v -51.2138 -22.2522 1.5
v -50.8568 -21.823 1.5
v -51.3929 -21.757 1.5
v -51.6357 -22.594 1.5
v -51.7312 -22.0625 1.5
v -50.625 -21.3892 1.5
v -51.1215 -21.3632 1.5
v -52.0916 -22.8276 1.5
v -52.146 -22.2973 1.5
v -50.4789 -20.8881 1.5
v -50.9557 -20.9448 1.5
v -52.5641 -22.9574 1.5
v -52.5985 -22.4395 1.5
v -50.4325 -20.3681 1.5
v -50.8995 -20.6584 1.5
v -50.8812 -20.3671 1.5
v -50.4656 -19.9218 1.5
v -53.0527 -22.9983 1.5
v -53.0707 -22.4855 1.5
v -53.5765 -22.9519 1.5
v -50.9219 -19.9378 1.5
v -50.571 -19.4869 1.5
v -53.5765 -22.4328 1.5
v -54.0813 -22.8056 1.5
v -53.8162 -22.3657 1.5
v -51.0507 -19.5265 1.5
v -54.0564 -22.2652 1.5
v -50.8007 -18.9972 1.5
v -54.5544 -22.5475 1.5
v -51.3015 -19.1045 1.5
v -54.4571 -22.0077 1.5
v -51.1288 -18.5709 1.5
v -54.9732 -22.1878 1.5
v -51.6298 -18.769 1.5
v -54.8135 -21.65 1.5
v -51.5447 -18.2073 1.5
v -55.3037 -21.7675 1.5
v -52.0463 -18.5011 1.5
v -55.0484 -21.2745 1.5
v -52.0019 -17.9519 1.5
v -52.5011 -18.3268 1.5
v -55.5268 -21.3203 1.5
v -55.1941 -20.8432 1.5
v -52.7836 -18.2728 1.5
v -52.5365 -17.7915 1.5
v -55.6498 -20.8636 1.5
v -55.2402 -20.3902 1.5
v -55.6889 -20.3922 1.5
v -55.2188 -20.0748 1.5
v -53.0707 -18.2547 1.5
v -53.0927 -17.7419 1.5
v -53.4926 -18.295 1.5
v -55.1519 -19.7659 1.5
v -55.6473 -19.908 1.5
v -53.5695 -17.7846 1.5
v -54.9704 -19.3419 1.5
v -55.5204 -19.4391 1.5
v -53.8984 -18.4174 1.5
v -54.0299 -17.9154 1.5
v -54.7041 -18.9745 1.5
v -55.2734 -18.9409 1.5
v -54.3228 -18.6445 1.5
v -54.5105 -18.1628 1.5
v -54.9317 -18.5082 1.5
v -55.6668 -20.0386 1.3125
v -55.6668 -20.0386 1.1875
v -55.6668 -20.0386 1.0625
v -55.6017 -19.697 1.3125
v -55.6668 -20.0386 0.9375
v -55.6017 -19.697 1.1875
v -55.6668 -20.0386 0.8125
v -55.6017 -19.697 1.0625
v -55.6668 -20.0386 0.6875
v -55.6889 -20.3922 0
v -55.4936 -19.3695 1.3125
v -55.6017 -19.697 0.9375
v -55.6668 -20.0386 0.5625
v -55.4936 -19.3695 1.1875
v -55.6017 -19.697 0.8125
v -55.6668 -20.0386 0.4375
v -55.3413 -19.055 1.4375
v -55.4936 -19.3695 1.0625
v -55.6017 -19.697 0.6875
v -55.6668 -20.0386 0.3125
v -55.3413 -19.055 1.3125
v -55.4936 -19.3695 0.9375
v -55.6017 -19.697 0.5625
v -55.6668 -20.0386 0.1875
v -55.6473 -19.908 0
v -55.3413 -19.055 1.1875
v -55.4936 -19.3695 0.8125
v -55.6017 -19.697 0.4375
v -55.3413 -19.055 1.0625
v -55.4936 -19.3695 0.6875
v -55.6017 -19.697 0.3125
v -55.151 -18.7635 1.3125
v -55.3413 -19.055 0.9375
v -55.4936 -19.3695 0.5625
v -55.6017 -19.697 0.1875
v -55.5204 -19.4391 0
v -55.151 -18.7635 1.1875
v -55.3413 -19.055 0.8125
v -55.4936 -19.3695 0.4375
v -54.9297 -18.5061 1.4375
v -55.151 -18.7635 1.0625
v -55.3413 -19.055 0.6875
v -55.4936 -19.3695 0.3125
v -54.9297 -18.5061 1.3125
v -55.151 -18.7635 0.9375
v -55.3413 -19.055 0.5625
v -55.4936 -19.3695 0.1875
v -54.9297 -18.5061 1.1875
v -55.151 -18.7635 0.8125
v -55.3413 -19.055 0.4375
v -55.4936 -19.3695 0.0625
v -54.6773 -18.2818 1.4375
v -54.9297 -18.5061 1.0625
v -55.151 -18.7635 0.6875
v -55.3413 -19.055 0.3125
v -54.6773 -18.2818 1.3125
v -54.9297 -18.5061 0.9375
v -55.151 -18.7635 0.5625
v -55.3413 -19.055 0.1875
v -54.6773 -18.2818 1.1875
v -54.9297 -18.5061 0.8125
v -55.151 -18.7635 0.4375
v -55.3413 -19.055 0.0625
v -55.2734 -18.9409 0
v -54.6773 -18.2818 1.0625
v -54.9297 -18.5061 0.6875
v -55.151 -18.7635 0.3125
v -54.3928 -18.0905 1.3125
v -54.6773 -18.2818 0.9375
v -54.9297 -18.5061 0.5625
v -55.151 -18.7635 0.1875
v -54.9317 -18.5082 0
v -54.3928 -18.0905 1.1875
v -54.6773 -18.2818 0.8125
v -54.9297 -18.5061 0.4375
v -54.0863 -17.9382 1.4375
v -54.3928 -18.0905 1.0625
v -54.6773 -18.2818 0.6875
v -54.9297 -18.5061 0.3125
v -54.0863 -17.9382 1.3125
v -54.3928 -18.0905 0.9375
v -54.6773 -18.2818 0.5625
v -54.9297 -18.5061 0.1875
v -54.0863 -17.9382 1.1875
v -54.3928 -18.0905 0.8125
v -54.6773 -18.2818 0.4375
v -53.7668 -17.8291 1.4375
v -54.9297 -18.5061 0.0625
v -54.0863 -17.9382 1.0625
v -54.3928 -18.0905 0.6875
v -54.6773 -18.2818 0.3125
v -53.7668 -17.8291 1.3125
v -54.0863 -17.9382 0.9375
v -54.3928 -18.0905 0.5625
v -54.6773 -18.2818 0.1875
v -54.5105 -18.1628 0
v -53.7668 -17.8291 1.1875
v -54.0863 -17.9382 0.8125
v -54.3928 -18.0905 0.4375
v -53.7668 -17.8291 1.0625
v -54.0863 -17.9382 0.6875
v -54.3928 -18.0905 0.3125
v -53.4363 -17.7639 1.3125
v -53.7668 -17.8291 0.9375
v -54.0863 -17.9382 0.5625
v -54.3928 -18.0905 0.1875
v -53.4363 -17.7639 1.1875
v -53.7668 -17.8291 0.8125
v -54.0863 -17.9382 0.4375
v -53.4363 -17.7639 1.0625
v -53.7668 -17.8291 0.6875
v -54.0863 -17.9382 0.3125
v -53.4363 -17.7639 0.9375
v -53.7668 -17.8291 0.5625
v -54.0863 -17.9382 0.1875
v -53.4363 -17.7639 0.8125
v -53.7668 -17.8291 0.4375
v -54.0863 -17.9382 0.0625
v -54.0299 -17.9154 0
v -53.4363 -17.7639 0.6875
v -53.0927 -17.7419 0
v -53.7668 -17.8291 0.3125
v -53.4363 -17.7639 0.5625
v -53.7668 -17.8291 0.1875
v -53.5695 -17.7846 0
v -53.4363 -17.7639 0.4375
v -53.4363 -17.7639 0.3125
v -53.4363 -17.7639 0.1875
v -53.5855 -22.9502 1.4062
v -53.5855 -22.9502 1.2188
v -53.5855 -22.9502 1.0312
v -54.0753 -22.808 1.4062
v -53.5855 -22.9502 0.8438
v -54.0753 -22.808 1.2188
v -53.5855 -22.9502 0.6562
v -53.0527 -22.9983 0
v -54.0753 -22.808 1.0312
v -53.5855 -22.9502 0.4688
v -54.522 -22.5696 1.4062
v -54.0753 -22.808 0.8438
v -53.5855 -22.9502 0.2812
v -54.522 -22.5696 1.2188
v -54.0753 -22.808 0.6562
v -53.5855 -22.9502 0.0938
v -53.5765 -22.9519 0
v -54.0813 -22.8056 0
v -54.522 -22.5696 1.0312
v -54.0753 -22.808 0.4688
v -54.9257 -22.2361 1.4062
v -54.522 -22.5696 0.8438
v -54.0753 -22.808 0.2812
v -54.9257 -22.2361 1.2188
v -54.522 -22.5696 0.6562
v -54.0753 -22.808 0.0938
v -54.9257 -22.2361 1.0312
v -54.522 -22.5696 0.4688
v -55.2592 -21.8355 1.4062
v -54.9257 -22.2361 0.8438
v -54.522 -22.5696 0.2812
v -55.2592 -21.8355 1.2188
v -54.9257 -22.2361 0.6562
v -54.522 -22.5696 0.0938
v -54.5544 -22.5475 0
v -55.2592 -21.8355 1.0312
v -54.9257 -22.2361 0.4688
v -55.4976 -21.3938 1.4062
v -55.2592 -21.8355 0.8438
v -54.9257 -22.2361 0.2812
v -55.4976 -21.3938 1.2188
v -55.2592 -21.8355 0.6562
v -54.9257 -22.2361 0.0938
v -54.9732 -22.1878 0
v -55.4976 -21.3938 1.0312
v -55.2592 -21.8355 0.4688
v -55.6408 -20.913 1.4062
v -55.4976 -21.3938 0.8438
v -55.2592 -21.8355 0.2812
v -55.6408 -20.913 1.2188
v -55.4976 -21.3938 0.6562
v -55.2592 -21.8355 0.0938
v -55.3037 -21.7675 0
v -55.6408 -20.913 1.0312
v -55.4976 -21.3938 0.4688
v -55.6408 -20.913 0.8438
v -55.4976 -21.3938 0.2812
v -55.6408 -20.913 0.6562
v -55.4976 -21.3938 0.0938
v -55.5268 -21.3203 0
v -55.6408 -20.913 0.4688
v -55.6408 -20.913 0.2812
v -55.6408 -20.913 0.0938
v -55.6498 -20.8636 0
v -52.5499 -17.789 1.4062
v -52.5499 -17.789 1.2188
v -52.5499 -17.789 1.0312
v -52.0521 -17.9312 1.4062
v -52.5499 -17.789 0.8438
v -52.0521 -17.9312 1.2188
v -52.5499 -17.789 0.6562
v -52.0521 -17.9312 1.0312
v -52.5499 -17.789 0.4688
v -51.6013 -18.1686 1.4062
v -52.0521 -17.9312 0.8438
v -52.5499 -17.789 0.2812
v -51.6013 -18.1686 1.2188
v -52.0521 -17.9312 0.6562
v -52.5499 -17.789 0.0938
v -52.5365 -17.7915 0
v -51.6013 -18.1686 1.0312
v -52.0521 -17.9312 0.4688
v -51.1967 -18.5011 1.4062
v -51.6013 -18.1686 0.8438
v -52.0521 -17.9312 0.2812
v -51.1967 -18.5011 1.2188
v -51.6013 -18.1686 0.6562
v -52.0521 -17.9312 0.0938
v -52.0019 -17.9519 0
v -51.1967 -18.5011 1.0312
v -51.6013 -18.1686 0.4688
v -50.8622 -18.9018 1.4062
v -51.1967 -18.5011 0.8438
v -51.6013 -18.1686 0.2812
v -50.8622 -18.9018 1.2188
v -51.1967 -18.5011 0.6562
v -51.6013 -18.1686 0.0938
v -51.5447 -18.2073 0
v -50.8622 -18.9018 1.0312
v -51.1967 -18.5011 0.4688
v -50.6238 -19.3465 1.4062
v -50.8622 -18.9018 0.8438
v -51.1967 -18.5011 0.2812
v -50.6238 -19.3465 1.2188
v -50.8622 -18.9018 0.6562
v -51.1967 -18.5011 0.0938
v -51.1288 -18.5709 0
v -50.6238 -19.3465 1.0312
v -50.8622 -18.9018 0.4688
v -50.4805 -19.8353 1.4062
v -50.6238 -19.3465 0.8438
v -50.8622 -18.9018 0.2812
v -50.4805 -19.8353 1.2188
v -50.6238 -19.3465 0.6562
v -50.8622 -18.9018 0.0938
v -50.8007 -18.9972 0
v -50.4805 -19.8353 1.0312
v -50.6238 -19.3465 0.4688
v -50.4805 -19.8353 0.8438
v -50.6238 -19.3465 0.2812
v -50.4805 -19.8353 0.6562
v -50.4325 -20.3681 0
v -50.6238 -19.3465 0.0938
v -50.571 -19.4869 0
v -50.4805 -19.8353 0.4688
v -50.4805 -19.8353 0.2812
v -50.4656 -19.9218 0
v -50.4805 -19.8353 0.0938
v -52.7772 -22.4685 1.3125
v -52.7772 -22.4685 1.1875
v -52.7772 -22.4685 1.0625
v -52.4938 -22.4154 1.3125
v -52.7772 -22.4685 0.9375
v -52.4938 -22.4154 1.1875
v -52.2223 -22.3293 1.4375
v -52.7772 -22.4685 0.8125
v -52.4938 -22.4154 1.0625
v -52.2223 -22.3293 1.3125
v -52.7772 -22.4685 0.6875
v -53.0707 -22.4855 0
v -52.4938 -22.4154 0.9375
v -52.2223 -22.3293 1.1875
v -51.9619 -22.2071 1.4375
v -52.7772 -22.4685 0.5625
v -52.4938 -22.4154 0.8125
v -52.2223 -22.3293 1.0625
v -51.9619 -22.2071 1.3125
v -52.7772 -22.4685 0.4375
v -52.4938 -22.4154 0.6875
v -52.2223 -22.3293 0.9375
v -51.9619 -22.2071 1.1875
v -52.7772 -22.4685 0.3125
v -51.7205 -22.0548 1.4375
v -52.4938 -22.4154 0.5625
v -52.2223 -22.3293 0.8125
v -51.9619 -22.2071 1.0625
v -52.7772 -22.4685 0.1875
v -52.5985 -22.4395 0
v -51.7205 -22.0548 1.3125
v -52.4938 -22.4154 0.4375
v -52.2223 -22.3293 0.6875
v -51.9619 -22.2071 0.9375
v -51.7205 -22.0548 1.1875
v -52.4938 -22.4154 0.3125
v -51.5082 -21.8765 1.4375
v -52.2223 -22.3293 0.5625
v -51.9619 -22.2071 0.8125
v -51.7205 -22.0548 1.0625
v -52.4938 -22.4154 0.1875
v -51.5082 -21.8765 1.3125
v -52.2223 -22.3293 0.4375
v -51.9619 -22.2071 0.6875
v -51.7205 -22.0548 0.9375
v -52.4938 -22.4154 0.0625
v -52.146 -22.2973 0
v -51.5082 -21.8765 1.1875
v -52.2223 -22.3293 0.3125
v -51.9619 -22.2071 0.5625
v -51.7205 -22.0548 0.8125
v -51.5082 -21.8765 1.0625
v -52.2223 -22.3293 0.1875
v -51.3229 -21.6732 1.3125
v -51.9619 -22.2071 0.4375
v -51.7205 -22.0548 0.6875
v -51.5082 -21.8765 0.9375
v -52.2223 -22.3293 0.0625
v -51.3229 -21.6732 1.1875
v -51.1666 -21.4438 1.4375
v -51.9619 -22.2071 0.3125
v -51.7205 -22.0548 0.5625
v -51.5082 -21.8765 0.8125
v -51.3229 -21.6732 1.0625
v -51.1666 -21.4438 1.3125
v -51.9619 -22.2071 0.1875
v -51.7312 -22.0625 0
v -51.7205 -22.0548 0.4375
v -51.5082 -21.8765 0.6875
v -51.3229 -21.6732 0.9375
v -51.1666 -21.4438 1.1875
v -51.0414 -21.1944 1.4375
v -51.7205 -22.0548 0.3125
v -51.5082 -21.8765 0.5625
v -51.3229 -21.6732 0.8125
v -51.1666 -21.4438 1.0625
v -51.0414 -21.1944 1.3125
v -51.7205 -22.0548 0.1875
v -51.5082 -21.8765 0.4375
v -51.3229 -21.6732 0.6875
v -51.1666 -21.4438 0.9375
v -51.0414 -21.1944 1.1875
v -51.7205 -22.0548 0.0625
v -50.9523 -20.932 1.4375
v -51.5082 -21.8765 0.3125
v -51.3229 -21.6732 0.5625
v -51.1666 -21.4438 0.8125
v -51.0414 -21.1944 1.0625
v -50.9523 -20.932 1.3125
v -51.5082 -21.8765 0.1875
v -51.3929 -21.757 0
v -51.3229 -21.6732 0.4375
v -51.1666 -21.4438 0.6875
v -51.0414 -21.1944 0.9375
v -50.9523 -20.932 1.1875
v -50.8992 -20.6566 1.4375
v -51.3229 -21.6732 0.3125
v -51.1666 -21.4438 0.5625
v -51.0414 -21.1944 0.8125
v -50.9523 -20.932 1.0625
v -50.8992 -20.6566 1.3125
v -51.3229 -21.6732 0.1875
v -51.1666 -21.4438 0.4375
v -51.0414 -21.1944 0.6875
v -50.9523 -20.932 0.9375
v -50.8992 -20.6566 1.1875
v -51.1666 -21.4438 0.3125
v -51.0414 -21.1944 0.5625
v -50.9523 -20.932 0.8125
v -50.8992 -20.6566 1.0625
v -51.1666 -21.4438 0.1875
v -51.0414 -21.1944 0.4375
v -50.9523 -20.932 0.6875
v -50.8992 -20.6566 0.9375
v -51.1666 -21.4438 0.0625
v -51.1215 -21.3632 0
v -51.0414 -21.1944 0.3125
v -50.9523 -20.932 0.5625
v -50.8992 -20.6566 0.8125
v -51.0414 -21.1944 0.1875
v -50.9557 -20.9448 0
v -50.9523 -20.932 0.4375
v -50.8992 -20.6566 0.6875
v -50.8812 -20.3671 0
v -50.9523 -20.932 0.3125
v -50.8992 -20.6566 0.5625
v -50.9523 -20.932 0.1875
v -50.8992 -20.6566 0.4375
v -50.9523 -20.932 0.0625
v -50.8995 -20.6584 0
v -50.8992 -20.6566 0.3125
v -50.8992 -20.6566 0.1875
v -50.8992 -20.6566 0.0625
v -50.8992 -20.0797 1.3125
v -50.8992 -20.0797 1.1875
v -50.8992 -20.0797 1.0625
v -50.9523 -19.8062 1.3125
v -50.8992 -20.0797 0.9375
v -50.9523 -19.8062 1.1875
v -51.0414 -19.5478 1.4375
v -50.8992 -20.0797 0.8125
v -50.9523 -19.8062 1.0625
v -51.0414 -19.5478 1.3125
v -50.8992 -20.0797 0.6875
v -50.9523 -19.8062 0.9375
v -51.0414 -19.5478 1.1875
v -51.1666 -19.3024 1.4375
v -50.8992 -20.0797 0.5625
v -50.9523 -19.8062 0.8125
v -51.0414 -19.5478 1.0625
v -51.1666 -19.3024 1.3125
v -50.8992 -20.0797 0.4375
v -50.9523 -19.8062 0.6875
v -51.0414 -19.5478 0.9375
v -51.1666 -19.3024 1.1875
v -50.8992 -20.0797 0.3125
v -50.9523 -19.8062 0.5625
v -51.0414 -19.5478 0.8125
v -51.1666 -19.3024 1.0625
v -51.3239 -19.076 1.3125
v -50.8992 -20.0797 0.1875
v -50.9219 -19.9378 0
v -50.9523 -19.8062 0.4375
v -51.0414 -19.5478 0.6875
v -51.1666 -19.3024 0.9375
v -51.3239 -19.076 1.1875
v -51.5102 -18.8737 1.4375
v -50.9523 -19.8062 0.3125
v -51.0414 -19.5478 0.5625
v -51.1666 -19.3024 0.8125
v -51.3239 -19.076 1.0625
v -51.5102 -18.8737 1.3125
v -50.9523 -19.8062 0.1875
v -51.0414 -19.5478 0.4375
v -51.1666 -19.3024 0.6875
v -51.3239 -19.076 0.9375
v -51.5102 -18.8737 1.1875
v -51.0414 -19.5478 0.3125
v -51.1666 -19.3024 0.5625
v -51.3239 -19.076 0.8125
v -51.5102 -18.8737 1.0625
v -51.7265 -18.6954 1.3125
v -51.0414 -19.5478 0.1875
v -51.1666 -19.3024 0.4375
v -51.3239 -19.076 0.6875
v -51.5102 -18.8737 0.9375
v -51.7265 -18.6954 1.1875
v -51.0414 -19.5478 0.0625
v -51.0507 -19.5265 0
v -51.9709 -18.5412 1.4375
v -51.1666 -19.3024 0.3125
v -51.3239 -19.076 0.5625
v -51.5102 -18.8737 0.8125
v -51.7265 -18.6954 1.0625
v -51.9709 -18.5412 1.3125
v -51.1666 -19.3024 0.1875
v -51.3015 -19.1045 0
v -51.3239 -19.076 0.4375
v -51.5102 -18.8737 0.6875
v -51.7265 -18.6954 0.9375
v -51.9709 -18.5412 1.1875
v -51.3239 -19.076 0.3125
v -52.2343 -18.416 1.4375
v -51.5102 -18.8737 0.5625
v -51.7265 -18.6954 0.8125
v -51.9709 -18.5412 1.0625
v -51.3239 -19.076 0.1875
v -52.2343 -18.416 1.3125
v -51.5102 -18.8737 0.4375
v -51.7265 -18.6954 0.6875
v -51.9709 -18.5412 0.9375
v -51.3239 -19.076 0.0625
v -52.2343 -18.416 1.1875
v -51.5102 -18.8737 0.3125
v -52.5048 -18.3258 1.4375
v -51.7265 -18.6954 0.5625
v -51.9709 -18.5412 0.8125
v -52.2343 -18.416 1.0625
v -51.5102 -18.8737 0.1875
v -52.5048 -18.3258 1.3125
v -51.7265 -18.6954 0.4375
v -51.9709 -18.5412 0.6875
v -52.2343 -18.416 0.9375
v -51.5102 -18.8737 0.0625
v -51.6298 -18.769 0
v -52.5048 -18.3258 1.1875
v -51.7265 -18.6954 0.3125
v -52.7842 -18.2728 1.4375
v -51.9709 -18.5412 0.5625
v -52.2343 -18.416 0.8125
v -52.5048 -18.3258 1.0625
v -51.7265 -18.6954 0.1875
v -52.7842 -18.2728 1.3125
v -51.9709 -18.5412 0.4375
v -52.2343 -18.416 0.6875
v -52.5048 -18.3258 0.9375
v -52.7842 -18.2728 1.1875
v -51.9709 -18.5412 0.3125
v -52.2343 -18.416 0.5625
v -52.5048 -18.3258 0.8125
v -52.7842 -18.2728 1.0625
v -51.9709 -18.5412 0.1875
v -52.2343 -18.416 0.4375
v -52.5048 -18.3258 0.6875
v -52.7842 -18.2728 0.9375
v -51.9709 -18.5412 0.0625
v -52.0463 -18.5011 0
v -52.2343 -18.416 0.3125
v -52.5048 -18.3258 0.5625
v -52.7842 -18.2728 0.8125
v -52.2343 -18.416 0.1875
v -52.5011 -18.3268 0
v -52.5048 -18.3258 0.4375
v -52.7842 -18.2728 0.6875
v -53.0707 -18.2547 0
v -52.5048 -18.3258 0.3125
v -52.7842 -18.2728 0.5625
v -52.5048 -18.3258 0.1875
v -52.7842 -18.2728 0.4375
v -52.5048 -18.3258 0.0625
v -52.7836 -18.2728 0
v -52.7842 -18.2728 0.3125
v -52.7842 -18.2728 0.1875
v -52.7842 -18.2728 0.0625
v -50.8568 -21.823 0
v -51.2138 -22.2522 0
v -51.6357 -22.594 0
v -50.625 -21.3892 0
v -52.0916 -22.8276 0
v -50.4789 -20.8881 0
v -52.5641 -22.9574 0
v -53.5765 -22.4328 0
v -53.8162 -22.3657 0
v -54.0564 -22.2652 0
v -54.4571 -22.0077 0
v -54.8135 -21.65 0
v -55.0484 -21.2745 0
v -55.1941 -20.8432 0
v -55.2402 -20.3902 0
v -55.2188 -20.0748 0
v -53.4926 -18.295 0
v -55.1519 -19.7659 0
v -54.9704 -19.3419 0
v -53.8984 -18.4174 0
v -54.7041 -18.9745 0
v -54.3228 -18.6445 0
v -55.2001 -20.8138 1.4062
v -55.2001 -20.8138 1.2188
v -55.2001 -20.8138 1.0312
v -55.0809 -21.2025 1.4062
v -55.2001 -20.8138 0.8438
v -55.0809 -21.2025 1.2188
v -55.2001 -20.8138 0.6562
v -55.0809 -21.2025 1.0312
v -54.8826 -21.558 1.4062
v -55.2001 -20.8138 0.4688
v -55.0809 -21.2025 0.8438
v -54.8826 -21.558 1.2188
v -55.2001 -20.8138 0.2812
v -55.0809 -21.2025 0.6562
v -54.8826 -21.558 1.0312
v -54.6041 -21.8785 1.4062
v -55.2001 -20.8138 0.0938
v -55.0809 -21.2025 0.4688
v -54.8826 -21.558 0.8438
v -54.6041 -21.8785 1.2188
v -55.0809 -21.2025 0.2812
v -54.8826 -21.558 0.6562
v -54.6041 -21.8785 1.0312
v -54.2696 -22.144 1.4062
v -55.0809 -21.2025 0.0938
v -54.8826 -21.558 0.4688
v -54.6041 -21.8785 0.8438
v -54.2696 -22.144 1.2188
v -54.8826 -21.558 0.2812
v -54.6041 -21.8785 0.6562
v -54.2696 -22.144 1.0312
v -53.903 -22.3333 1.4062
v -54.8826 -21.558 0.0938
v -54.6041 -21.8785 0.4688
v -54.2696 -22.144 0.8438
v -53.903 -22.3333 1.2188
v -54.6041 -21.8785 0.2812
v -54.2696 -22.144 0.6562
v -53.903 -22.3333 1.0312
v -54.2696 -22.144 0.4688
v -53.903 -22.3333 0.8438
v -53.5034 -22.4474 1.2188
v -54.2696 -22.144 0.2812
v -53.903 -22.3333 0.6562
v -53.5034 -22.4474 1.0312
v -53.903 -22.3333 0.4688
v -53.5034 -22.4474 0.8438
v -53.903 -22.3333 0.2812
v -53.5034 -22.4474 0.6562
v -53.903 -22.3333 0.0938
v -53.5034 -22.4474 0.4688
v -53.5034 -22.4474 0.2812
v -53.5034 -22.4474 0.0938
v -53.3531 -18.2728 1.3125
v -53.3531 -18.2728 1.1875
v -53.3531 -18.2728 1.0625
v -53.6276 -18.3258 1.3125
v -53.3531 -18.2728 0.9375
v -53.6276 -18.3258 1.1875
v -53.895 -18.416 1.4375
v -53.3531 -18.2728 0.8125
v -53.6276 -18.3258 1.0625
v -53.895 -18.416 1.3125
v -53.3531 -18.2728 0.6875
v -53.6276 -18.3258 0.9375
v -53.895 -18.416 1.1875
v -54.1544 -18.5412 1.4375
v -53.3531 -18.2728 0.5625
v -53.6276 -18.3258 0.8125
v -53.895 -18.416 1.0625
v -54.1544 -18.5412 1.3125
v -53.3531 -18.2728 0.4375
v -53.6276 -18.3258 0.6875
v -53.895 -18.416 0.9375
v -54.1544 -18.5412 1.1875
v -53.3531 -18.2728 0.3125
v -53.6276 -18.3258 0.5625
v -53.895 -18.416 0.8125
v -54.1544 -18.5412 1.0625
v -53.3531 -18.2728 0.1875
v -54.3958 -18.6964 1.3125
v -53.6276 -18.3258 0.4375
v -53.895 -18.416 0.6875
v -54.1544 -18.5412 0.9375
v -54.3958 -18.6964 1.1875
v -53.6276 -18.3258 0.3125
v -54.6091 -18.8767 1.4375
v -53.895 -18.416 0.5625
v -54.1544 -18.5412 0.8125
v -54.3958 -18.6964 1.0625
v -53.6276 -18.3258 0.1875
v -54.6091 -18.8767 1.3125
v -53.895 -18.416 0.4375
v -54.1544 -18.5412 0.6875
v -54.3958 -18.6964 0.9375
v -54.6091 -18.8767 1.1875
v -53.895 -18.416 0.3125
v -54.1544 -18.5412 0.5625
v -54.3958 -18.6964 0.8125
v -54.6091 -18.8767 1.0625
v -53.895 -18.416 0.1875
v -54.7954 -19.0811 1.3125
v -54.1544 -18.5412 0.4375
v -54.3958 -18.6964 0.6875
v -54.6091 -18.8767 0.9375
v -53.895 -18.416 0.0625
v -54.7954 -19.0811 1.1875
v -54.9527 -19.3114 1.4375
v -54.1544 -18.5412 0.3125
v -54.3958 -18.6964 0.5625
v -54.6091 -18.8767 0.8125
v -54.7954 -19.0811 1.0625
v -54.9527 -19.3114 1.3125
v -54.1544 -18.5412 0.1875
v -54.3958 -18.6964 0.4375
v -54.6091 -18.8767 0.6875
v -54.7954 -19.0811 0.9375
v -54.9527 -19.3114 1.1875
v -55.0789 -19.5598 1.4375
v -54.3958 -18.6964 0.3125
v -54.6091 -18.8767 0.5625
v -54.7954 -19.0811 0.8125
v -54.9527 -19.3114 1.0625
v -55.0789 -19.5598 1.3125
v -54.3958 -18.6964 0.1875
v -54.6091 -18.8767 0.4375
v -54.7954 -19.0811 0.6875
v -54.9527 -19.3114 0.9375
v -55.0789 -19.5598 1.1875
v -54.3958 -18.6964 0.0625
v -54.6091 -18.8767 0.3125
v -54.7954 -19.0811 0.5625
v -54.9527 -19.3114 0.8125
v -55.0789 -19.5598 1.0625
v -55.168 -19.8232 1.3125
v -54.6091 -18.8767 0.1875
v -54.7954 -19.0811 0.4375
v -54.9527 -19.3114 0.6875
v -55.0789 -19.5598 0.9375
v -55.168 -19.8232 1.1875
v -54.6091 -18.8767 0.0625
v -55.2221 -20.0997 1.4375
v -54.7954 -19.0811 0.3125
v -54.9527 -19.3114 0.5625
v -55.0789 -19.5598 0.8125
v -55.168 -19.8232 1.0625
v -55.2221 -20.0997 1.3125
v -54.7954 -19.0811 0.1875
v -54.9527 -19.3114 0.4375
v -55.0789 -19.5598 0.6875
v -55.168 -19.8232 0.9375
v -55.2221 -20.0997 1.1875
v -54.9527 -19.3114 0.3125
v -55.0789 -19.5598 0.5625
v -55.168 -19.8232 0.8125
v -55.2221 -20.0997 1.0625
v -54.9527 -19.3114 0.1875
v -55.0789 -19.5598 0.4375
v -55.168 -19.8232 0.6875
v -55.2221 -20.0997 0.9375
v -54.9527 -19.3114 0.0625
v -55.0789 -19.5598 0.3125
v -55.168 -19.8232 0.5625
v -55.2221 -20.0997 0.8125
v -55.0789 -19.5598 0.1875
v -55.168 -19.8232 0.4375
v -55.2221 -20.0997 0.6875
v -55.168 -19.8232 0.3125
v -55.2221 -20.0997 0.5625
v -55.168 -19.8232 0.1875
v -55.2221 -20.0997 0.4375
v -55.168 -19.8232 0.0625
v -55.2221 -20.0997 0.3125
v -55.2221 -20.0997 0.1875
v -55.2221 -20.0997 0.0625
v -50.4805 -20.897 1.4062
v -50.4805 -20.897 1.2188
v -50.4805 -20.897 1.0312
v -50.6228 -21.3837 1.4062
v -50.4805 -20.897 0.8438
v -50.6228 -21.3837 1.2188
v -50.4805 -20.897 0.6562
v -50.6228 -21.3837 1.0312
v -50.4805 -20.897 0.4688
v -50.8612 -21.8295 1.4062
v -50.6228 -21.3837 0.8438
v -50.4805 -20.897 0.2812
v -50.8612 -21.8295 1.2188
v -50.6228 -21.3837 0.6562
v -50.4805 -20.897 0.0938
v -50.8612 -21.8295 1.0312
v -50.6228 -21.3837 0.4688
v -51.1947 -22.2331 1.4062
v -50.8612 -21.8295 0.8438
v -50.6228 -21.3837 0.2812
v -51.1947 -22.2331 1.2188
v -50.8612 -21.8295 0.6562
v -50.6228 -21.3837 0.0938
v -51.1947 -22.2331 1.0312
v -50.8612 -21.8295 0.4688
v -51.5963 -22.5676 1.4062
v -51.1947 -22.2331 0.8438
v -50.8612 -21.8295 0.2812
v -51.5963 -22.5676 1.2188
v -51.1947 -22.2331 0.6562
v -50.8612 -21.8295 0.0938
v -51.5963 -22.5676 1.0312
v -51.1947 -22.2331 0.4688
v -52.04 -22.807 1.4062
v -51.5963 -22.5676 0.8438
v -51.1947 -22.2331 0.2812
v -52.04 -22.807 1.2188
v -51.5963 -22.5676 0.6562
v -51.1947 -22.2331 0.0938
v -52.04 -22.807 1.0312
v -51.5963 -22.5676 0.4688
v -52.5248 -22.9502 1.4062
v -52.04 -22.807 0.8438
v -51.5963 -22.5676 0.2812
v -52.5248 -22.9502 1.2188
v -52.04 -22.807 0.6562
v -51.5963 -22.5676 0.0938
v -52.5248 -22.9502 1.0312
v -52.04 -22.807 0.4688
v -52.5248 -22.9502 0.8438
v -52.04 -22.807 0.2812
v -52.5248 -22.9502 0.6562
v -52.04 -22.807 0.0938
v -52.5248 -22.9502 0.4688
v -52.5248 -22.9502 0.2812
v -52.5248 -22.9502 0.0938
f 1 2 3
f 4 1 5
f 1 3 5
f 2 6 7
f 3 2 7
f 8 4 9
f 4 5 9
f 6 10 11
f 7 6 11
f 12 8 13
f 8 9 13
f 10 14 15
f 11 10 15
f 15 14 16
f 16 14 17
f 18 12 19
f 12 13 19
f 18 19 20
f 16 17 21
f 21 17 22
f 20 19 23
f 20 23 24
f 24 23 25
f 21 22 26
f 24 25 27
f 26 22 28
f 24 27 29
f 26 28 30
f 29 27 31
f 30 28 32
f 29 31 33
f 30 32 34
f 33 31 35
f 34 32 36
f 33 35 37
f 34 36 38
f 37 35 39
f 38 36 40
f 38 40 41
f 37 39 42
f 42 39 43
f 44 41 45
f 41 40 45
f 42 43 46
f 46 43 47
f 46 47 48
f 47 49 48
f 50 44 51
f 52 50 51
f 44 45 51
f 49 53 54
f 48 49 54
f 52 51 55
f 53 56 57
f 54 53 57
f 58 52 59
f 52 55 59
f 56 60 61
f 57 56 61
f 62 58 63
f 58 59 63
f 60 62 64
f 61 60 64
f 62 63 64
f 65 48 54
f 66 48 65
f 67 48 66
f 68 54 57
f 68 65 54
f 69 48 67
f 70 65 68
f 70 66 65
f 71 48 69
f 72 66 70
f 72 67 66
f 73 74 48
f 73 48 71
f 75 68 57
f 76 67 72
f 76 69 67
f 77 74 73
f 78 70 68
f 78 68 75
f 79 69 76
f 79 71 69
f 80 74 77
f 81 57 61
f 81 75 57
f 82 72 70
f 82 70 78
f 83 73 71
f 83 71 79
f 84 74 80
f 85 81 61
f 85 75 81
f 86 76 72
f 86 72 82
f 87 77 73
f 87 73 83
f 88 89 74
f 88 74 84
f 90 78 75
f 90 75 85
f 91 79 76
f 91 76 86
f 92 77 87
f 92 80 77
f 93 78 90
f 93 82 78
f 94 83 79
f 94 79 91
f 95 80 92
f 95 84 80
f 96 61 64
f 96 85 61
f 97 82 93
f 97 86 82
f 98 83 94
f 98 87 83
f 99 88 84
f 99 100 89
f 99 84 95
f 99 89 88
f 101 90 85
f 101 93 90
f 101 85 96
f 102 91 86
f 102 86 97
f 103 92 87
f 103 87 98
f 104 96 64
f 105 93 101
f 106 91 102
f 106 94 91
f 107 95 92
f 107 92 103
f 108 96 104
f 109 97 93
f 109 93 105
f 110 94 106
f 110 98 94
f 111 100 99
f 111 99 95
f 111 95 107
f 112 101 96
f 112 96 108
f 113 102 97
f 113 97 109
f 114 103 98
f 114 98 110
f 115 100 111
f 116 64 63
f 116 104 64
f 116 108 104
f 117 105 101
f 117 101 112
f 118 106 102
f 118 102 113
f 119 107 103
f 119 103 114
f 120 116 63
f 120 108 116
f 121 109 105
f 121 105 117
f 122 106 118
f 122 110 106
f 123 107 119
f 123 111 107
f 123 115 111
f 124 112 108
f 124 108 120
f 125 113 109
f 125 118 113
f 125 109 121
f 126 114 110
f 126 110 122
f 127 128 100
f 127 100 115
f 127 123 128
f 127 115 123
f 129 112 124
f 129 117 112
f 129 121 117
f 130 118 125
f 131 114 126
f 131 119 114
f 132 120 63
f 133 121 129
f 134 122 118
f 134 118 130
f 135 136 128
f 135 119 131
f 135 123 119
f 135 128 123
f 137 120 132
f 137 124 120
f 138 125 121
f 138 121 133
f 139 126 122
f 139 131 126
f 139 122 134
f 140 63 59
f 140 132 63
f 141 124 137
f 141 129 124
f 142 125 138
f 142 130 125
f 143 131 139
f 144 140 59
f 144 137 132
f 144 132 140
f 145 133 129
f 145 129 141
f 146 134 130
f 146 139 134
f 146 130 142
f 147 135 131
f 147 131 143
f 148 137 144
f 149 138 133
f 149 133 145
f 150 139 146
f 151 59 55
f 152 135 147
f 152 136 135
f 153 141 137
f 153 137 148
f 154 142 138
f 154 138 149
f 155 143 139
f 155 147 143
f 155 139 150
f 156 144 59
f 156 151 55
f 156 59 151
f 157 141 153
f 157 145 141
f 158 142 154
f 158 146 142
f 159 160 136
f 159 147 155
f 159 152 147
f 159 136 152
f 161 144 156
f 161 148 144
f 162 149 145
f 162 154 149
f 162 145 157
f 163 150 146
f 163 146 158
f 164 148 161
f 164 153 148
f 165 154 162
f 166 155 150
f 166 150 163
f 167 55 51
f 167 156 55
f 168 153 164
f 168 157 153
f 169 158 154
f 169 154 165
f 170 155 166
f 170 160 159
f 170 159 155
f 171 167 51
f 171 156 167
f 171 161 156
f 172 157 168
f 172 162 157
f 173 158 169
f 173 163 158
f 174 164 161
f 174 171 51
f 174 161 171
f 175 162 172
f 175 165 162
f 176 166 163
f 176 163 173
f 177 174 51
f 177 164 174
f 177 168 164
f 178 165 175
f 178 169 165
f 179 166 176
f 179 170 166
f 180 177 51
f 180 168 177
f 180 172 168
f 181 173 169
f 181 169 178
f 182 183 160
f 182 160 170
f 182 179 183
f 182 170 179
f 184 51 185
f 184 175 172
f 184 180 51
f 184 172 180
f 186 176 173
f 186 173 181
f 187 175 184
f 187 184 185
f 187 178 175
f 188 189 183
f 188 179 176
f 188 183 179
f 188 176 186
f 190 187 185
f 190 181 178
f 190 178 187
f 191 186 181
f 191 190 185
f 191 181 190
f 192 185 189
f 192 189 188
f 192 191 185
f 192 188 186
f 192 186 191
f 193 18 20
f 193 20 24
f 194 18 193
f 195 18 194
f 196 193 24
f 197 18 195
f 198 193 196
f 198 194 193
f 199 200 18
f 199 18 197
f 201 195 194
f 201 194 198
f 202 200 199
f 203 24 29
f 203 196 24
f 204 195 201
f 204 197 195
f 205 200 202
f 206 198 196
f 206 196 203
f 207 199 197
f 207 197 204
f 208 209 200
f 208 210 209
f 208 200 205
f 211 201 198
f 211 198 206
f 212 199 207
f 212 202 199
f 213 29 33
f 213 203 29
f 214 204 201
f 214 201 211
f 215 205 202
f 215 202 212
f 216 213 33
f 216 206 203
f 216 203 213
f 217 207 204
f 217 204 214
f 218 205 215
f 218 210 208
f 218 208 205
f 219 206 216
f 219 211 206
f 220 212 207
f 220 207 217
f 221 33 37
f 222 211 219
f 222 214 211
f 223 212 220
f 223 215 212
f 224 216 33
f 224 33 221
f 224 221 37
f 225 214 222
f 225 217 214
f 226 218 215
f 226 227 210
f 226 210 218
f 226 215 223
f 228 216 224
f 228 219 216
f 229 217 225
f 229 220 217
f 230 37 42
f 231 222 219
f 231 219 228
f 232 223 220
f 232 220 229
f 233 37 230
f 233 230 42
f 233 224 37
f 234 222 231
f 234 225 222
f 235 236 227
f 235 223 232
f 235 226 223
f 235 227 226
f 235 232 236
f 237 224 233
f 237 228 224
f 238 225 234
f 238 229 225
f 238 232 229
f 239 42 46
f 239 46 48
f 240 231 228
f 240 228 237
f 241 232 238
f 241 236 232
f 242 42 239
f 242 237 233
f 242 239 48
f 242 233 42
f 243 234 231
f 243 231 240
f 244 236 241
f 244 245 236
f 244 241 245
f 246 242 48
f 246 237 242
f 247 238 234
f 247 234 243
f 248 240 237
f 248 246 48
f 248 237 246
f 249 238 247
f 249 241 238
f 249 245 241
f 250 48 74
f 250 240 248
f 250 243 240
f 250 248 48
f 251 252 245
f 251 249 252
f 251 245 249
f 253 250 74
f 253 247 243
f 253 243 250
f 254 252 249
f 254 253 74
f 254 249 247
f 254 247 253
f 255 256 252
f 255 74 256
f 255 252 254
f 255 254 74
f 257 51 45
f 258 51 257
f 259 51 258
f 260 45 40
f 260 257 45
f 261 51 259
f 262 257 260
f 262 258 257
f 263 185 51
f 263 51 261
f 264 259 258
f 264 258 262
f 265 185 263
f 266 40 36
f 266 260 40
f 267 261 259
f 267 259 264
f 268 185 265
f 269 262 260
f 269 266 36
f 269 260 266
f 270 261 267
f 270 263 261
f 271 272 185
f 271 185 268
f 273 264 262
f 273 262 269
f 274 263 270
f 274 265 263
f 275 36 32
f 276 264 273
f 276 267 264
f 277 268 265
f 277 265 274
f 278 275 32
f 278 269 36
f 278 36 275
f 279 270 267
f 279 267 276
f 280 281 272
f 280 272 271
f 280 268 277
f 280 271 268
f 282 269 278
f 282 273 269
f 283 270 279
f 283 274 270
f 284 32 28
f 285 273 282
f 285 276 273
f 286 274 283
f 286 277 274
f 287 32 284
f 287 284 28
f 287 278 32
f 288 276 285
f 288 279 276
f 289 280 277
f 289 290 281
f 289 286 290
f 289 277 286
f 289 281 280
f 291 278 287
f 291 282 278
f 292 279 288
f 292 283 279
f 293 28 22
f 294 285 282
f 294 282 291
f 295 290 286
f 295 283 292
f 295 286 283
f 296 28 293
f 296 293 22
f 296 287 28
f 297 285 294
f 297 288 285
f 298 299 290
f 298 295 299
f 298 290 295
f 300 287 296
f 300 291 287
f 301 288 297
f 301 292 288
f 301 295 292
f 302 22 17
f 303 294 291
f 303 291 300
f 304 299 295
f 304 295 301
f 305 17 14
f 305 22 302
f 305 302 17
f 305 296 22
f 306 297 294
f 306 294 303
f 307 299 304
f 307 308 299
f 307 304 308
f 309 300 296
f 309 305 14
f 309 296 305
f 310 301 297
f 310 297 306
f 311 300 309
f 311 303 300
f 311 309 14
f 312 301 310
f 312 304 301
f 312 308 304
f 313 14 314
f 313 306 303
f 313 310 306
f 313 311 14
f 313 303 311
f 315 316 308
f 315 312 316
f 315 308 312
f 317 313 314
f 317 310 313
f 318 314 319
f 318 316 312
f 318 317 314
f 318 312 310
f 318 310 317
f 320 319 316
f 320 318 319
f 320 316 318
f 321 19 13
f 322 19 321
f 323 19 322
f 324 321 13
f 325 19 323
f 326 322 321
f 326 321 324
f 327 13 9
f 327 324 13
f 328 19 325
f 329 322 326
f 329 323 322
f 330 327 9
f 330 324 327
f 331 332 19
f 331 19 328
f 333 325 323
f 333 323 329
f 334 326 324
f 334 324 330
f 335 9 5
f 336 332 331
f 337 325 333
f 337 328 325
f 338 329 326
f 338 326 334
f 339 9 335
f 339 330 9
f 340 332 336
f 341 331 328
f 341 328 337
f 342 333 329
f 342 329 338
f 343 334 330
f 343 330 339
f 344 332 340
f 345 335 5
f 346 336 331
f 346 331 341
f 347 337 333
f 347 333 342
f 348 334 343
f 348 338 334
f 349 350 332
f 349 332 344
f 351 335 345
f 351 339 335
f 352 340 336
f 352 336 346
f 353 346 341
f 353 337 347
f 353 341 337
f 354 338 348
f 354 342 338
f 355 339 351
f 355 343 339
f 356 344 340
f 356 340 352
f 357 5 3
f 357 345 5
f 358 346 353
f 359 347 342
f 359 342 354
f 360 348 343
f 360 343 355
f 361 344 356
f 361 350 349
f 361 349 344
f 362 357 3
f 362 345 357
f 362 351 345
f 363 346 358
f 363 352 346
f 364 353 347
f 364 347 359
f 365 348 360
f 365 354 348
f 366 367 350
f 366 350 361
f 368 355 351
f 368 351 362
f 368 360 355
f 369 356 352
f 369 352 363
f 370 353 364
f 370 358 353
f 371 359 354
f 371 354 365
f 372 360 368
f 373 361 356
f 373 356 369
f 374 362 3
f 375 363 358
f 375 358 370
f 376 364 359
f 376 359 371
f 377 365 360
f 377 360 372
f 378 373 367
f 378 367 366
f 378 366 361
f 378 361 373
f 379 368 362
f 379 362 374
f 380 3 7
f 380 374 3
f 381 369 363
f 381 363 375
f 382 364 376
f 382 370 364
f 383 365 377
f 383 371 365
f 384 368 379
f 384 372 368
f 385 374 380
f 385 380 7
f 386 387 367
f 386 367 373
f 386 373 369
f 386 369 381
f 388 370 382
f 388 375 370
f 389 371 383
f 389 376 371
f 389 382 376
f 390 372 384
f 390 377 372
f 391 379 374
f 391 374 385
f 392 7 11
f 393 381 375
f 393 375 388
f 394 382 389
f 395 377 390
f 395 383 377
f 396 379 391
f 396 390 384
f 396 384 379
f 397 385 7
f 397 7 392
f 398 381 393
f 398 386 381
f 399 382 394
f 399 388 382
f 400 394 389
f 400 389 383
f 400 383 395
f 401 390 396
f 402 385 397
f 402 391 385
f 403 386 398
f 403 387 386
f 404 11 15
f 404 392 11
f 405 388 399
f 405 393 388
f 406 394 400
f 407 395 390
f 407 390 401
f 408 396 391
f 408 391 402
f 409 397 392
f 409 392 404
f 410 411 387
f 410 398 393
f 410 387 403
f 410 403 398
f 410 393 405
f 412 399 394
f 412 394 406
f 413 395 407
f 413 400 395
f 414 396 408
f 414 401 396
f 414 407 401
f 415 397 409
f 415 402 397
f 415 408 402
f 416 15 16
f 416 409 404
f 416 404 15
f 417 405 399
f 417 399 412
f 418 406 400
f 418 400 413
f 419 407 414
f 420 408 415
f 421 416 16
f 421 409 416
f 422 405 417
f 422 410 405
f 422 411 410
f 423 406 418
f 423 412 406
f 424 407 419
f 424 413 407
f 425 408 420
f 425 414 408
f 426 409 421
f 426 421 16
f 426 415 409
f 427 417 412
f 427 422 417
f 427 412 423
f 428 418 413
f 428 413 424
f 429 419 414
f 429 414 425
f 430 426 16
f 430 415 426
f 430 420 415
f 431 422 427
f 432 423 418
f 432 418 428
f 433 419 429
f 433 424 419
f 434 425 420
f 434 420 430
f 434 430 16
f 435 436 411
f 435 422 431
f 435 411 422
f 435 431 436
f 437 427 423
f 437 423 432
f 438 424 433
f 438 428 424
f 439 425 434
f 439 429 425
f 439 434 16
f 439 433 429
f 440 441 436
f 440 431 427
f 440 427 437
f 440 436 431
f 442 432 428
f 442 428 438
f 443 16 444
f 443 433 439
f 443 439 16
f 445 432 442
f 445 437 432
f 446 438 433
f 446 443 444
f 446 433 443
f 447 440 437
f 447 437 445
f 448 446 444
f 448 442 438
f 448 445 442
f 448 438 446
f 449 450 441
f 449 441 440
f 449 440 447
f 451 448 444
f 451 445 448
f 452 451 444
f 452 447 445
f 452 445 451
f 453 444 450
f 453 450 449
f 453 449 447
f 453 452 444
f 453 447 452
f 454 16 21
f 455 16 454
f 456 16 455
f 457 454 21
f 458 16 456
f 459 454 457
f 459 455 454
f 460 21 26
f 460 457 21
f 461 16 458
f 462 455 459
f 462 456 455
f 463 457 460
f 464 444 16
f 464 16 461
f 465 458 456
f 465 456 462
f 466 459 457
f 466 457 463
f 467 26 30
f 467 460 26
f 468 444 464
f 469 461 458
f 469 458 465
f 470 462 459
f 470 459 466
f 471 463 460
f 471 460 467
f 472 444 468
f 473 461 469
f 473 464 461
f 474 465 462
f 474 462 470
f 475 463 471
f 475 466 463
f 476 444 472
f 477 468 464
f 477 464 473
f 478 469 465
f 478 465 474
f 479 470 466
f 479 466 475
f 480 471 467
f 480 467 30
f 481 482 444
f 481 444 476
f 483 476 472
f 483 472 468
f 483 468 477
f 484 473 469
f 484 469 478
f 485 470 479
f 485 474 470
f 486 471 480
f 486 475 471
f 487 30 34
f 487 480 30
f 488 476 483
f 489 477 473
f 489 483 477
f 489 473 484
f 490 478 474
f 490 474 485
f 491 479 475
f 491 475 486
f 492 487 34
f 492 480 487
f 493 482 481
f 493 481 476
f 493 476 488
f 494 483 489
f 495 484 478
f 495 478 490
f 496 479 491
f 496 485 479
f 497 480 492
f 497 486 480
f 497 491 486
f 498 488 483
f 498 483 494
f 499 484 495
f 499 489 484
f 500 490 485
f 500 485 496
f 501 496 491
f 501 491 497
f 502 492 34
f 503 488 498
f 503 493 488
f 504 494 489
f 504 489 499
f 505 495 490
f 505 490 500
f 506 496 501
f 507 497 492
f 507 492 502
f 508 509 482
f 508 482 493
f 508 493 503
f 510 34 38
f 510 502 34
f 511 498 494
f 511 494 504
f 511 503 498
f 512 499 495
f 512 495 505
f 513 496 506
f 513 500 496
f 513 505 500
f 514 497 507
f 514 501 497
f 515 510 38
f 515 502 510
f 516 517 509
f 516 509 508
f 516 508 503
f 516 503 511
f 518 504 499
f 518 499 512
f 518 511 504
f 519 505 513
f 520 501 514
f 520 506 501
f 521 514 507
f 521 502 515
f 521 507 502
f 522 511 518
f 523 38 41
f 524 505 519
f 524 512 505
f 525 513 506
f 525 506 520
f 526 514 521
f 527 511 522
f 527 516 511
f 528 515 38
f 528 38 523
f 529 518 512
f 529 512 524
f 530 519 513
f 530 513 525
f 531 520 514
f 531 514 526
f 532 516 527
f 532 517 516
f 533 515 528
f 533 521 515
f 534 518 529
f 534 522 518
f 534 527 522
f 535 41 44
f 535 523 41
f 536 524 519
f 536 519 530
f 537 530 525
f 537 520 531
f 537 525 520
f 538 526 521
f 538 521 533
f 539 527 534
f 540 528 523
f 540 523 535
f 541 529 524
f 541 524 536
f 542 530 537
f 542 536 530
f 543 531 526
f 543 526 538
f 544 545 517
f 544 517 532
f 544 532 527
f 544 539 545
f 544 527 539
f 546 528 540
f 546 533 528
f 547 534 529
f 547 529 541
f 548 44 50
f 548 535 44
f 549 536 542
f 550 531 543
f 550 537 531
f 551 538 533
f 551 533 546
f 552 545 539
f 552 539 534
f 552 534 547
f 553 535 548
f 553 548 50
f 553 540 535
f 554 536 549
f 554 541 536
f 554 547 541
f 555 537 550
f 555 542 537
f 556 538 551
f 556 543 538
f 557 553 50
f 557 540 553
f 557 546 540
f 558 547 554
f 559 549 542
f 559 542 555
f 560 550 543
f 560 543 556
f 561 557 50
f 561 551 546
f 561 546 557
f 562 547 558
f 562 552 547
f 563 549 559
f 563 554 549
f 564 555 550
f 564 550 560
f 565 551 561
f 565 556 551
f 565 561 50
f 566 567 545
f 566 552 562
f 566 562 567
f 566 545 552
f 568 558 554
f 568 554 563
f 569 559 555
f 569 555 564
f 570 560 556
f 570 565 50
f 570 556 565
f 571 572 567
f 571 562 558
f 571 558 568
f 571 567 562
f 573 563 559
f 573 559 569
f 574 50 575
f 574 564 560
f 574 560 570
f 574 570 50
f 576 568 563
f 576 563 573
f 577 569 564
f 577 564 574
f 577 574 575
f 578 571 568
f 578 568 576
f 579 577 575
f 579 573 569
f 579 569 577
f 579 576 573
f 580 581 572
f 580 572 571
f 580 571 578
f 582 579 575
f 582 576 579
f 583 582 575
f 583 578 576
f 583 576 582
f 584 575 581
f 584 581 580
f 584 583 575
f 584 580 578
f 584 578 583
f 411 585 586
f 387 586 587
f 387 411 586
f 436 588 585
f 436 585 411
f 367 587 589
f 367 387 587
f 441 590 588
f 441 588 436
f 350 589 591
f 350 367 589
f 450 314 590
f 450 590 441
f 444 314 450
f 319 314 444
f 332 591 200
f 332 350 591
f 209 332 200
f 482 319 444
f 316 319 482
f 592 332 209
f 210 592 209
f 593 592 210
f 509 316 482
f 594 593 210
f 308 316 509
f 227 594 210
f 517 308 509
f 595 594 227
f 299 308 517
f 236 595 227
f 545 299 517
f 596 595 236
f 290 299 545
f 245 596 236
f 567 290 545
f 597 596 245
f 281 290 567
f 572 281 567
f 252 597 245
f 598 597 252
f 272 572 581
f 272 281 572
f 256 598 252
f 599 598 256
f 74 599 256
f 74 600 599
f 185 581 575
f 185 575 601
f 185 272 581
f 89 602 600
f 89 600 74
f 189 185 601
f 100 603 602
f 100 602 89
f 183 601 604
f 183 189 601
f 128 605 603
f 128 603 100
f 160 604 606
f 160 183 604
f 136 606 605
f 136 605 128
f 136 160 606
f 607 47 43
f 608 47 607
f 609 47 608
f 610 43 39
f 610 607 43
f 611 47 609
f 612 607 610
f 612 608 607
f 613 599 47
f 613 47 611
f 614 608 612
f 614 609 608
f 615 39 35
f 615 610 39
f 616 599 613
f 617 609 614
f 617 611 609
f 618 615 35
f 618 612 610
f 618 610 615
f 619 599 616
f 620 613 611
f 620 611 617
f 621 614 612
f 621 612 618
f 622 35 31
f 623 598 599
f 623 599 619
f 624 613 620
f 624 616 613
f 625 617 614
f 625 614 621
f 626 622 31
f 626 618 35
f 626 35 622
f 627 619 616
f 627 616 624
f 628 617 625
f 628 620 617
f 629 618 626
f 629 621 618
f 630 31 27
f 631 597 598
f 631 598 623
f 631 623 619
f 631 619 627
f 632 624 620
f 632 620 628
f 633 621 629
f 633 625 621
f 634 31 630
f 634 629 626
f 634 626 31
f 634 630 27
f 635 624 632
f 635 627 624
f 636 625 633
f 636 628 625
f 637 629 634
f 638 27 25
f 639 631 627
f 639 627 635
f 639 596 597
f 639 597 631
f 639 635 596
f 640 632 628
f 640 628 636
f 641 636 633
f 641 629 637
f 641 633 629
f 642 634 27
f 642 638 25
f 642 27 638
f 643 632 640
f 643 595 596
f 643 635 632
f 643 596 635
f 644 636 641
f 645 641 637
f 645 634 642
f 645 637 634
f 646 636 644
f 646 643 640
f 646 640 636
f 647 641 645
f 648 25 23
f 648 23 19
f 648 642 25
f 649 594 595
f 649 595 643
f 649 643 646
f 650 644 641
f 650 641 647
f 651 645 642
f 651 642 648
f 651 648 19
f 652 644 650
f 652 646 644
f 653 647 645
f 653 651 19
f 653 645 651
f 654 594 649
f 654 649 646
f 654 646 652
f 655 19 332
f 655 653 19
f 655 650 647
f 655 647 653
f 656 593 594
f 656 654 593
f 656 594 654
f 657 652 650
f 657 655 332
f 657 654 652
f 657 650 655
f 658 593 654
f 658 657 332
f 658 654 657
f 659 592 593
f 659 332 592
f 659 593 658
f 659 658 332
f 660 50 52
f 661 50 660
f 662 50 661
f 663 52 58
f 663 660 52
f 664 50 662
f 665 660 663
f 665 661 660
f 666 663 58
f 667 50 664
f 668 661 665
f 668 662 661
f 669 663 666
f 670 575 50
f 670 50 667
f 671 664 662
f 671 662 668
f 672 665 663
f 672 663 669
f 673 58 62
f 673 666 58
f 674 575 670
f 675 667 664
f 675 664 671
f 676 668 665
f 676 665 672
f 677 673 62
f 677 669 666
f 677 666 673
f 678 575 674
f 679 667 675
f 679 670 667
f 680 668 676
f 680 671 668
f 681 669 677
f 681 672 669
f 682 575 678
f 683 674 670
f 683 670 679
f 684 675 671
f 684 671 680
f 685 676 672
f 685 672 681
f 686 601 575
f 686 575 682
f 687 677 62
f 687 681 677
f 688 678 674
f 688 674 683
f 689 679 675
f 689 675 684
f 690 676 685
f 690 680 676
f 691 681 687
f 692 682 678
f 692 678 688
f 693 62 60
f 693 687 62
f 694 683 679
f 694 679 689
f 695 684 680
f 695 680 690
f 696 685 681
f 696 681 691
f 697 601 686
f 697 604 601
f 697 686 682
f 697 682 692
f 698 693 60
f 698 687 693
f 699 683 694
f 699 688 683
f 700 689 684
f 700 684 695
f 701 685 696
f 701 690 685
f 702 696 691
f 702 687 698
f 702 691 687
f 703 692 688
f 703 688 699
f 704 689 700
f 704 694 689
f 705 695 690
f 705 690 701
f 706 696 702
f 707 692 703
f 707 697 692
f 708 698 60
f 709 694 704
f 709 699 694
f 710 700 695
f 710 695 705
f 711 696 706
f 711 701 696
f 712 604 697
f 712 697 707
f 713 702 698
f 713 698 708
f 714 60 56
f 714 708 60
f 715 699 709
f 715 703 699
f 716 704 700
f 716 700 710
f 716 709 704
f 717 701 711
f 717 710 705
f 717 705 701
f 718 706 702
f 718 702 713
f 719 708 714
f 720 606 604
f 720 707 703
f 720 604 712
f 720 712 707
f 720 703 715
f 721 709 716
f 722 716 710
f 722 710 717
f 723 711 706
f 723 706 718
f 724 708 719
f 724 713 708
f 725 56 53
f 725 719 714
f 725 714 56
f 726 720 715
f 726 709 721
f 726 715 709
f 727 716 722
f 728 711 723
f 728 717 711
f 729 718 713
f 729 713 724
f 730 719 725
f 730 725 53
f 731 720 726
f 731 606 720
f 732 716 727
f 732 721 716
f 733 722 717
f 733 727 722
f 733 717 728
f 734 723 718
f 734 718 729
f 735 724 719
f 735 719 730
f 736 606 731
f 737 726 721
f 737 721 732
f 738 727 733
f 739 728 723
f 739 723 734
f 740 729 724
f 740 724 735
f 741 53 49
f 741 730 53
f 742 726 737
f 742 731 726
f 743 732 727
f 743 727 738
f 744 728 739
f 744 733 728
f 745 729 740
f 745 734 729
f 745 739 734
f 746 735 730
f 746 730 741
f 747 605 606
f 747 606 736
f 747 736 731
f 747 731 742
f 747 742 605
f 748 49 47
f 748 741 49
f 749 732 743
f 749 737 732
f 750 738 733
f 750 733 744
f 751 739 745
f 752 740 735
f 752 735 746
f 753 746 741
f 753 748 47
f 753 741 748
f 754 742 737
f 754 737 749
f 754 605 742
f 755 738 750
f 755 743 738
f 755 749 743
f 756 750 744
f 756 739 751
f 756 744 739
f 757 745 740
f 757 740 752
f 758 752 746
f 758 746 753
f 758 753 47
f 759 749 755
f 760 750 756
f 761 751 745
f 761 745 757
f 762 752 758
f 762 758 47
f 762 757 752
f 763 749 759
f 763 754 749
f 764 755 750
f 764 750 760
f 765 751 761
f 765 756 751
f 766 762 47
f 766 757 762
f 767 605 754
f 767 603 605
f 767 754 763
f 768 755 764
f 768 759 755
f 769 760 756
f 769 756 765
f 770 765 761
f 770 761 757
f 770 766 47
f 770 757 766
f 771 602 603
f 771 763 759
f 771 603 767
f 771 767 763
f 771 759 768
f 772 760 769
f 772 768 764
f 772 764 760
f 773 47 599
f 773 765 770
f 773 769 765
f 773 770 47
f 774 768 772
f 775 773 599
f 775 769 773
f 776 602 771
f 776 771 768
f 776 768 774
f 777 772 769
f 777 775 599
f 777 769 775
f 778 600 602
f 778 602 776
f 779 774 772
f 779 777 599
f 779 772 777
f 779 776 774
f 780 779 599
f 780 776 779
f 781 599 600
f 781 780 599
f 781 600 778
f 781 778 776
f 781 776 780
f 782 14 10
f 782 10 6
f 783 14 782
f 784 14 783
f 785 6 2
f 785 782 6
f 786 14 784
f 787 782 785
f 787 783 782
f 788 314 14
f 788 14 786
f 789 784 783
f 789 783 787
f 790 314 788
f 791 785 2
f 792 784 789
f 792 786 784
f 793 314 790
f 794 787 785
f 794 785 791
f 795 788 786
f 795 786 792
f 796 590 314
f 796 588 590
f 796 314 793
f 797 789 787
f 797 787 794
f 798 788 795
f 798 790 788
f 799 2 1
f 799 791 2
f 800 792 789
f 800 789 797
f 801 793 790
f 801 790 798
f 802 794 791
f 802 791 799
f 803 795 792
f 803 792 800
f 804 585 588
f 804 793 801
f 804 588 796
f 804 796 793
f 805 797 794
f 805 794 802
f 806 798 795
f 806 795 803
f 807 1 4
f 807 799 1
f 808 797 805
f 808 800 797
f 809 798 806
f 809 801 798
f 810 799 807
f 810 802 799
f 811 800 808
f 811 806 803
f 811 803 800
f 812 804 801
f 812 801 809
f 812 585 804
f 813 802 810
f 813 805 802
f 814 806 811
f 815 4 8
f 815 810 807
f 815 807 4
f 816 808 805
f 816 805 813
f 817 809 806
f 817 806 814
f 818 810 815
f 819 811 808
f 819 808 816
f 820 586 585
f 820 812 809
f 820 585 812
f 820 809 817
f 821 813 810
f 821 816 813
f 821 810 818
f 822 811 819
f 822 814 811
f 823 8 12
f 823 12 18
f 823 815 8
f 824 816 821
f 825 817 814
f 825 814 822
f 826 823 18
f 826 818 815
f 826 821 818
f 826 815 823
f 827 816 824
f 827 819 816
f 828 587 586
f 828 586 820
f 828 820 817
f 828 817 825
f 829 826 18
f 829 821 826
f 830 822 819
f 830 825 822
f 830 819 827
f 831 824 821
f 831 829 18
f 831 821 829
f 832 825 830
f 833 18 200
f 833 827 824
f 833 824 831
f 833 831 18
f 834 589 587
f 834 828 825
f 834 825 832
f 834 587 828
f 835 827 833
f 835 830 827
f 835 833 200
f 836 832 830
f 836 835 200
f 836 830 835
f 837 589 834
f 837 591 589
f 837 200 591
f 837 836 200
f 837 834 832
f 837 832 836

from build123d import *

# Parameters (mm, degrees)
BOSS_EXTRU_1_DEPTH = 1.5


with BuildPart() as part:
    # Esquisse1 → Boss.-Extru.1 (new body)
    with BuildSketch(Plane.XY):
        with BuildLine():
            add(Edge.make_bspline(
                [(-53.092721736, -17.741913948), (-53.000138728, -17.744258919), (-52.818298061, -17.748864634), (-52.551048207, -17.784120496), (-52.295912356, -17.845113911), (-52.050812158, -17.926346743), (-51.818679334, -18.03471015), (-51.597766631, -18.165688934), (-51.388599668, -18.320655303), (-51.193997695, -18.498411342), (-51.015916337, -18.691816276), (-50.859022214, -18.89821329), (-50.727533223, -19.116354436), (-50.619553527, -19.345584195), (-50.534841227, -19.585384149), (-50.476385451, -19.837032724), (-50.439045236, -20.098899424), (-50.43467984, -20.277509231), (-50.432465326, -20.368115871)],
                knots=[0, 0, 0, 0, 1.065120563, 2.091984664, 3.0946048, 4.079830382, 5.057816894, 6.036188127, 7.030412546, 8.04752943, 9.064399622, 10.05169764, 11.02544977, 11.989514704, 12.962713494, 13.945757189, 14.957906945, 16, 16, 16, 16], degree=3))
            add(Edge.make_bspline(
                [(-50.432465326, -20.368115871), (-50.434679515, -20.45805508), (-50.439043939, -20.635335681), (-50.476427907, -20.895540601), (-50.535057907, -21.145670167), (-50.618766858, -21.385306814), (-50.726231828, -21.614703334), (-50.858596358, -21.833256125), (-51.014512373, -22.041036837), (-51.191950732, -22.235769216), (-51.385380792, -22.414337031), (-51.592852602, -22.569935425), (-51.809700201, -22.703827032), (-52.03871407, -22.810660852), (-52.27685698, -22.896049309), (-52.526260299, -22.954267352), (-52.785755376, -22.991820271), (-52.962713953, -22.996132437), (-53.052657634, -22.998324204)],
                knots=[0, 0, 0, 0, 1.043624062, 2.057103931, 3.04512605, 4.022047818, 4.998200453, 5.980619268, 6.982898556, 8.009068085, 9.034988726, 10.034168286, 11.015286542, 11.987931943, 12.962482838, 13.94673481, 14.956375938, 16, 16, 16, 16], degree=3))
            add(Edge.make_bspline(
                [(-53.052657634, -22.998324204), (-53.143263804, -22.996110795), (-53.321872683, -22.991747575), (-53.584068448, -22.954345568), (-53.835893797, -22.895857991), (-54.076628584, -22.812273082), (-54.306407055, -22.704248467), (-54.525678602, -22.572527925), (-54.733563098, -22.416232009), (-54.928337021, -22.238851188), (-55.106550162, -22.045748971), (-55.261920698, -21.838842893), (-55.39367086, -21.62219224), (-55.501332764, -21.395195777), (-55.586567706, -21.158950859), (-55.644717446, -20.911881606), (-55.682340234, -20.655396597), (-55.686675729, -20.480763885), (-55.688875582, -20.392154333)],
                knots=[0, 0, 0, 0, 1.053102029, 2.075944431, 3.073151272, 4.055350789, 5.033113405, 6.020478099, 7.024410459, 8.052272461, 9.079885166, 10.07527673, 11.055994387, 12.023226415, 12.992069828, 13.970394897, 14.97016774, 16, 16, 16, 16], degree=3))
            add(Edge.make_bspline(
                [(-55.688875582, -20.392154333), (-55.688111817, -20.332679091), (-55.686593922, -20.214478915), (-55.668320076, -20.0389552), (-55.64180336, -19.86625426), (-55.603800628, -19.696867192), (-55.554098246, -19.531208642), (-55.495452493, -19.368136124), (-55.423824143, -19.209302233), (-55.342851788, -19.05395453), (-55.252477777, -18.904514665), (-55.152655278, -18.763258118), (-55.046890465, -18.628999551), (-54.93094276, -18.505218117), (-54.808633553, -18.388312893), (-54.677978727, -18.28008044), (-54.539775521, -18.179544796), (-54.393429264, -18.088944309), (-54.242546014, -18.007002688), (-54.08700776, -17.936685758), (-53.928926944, -17.876334242), (-53.767563161, -17.827418777), (-53.603344915, -17.788801583), (-53.435913794, -17.762505363), (-53.265403185, -17.744184909), (-53.150529872, -17.742674192), (-53.092721736, -17.741913948)],
                knots=[0, 0, 0, 0, 1.037015668, 2.060948919, 3.074880161, 4.083647147, 5.086022904, 6.090072063, 7.104153813, 8.122640571, 9.144368836, 10.147691507, 11.138137339, 12.123020368, 13.103399296, 14.087645067, 15.080126199, 16.082011238, 17.087798457, 18.072939717, 19.057185487, 20.037253025, 21.01195951, 21.997135196, 22.992090687, 24, 24, 24, 24], degree=3))
        make_face()
        with BuildLine():
            add(Edge.make_bspline(
                [(-53.07068648, -18.254734461), (-53.118135956, -18.255312875), (-53.212581289, -18.256464175), (-53.352987769, -18.271629483), (-53.491547675, -18.29324361), (-53.628289621, -18.324074354), (-53.762641463, -18.366080144), (-53.895855522, -18.414424298), (-54.026717027, -18.473311571), (-54.154793967, -18.539844005), (-54.27895836, -18.613485321), (-54.396119362, -18.694873559), (-54.506580282, -18.782100066), (-54.610070663, -18.875368405), (-54.706286623, -18.97515355), (-54.797121911, -19.079942745), (-54.878935599, -19.19273116), (-54.953914994, -19.310460313), (-55.021011909, -19.432976858), (-55.080676702, -19.558990947), (-55.129482428, -19.689530499), (-55.169285823, -19.823179296), (-55.202285553, -19.959725667), (-55.223191159, -20.100205451), (-55.238523101, -20.243912754), (-55.239608594, -20.341029688), (-55.240157634, -20.390151128)],
                knots=[0, 0, 0, 0, 1.008559885, 2.007477868, 2.99961109, 3.989939068, 4.984837346, 5.991145699, 7.001802488, 8.033829008, 9.059044045, 10.069351652, 11.065060232, 12.050310815, 13.029377138, 14.011219647, 14.996725999, 15.989392538, 16.977580475, 17.965360261, 18.951710183, 19.937753436, 20.929683414, 21.935841486, 22.955955122, 24, 24, 24, 24], degree=3))
            add(Edge.make_bspline(
                [(-55.240157634, -20.390151128), (-55.238336402, -20.462382872), (-55.234753477, -20.604485058), (-55.203385519, -20.812725263), (-55.155068413, -21.012851387), (-55.083843604, -21.2037684), (-54.994771297, -21.387117375), (-54.884732882, -21.561271811), (-54.75436276, -21.726278774), (-54.606272008, -21.880986301), (-54.444382427, -22.022194593), (-54.272478527, -22.146142319), (-54.092401945, -22.251014105), (-53.903683084, -22.336449923), (-53.707329457, -22.404149548), (-53.502075813, -22.450547592), (-53.289289442, -22.481083957), (-53.144245649, -22.484016466), (-53.07068648, -22.485503692)],
                knots=[0, 0, 0, 0, 1.032063989, 2.030389145, 3.003944642, 3.970395727, 4.937377036, 5.913328081, 6.909231446, 7.93887556, 8.970685674, 9.976071282, 10.964166581, 11.944589148, 12.933237628, 13.927779006, 14.949070134, 16, 16, 16, 16], degree=3))
            add(Edge.make_bspline(
                [(-53.07068648, -22.485503692), (-53.021244335, -22.4848244), (-52.923185711, -22.48347716), (-52.777334965, -22.469907621), (-52.634111805, -22.448147808), (-52.49371712, -22.4168183), (-52.356310246, -22.377608005), (-52.22131767, -22.331025536), (-52.090177256, -22.272909531), (-51.96123463, -22.208698172), (-51.837811428, -22.135497947), (-51.719989239, -22.056872019), (-51.610737839, -21.969773989), (-51.50732488, -21.8778914), (-51.410713896, -21.779371617), (-51.321558204, -21.674342729), (-51.240158015, -21.56214179), (-51.165207091, -21.44459121), (-51.098345287, -21.321739421), (-51.040089432, -21.195268452), (-50.990666409, -21.065489725), (-50.950768545, -20.932216051), (-50.9195036, -20.795700553), (-50.897960857, -20.655760441), (-50.882891659, -20.512675666), (-50.881755834, -20.415898729), (-50.881183275, -20.367114269)],
                knots=[0, 0, 0, 0, 1.047197238, 2.076906641, 3.100256066, 4.114471768, 5.12198147, 6.126382909, 7.136867548, 8.15857795, 9.17633901, 10.174870724, 11.156907918, 12.133735059, 13.104061851, 14.077631395, 15.04955518, 16.038496417, 17.029181396, 18.010275684, 18.986308667, 19.968651475, 20.955262928, 21.950658345, 22.966943676, 24, 24, 24, 24], degree=3))
            add(Edge.make_bspline(
                [(-50.881183275, -20.367114269), (-50.881756293, -20.318663548), (-50.882892981, -20.222552619), (-50.897953659, -20.080465736), (-50.91952636, -19.941532577), (-50.950615942, -19.806298572), (-50.990687591, -19.674729251), (-51.040098063, -19.546948183), (-51.098362776, -19.422479333), (-51.165231668, -19.301630337), (-51.24039713, -19.185666426), (-51.322531764, -19.074805836), (-51.413053689, -18.971130491), (-51.509376582, -18.872080929), (-51.613906418, -18.779769658), (-51.726169696, -18.694166057), (-51.844803521, -18.613204236), (-51.970413857, -18.540167719), (-52.100048077, -18.472718816), (-52.233068017, -18.414931668), (-52.367966731, -18.36582864), (-52.504401177, -18.323947262), (-52.643519717, -18.293364362), (-52.78438233, -18.271610005), (-52.926794128, -18.256469453), (-53.022570156, -18.255314627), (-53.07068648, -18.254734461)],
                knots=[0, 0, 0, 0, 1.02996197, 2.043119294, 3.035359645, 4.018872909, 4.991431989, 5.957985074, 6.929999688, 7.912076566, 8.892894881, 9.867085534, 10.843653904, 11.817741046, 12.803660682, 13.806313499, 14.818574707, 15.856120519, 16.894564902, 17.924820532, 18.937903209, 19.946497019, 20.957711757, 21.963978472, 22.977135795, 24, 24, 24, 24], degree=3))
        make_face(mode=Mode.SUBTRACT)
    extrude(amount=BOSS_EXTRU_1_DEPTH)


solid = part.part
